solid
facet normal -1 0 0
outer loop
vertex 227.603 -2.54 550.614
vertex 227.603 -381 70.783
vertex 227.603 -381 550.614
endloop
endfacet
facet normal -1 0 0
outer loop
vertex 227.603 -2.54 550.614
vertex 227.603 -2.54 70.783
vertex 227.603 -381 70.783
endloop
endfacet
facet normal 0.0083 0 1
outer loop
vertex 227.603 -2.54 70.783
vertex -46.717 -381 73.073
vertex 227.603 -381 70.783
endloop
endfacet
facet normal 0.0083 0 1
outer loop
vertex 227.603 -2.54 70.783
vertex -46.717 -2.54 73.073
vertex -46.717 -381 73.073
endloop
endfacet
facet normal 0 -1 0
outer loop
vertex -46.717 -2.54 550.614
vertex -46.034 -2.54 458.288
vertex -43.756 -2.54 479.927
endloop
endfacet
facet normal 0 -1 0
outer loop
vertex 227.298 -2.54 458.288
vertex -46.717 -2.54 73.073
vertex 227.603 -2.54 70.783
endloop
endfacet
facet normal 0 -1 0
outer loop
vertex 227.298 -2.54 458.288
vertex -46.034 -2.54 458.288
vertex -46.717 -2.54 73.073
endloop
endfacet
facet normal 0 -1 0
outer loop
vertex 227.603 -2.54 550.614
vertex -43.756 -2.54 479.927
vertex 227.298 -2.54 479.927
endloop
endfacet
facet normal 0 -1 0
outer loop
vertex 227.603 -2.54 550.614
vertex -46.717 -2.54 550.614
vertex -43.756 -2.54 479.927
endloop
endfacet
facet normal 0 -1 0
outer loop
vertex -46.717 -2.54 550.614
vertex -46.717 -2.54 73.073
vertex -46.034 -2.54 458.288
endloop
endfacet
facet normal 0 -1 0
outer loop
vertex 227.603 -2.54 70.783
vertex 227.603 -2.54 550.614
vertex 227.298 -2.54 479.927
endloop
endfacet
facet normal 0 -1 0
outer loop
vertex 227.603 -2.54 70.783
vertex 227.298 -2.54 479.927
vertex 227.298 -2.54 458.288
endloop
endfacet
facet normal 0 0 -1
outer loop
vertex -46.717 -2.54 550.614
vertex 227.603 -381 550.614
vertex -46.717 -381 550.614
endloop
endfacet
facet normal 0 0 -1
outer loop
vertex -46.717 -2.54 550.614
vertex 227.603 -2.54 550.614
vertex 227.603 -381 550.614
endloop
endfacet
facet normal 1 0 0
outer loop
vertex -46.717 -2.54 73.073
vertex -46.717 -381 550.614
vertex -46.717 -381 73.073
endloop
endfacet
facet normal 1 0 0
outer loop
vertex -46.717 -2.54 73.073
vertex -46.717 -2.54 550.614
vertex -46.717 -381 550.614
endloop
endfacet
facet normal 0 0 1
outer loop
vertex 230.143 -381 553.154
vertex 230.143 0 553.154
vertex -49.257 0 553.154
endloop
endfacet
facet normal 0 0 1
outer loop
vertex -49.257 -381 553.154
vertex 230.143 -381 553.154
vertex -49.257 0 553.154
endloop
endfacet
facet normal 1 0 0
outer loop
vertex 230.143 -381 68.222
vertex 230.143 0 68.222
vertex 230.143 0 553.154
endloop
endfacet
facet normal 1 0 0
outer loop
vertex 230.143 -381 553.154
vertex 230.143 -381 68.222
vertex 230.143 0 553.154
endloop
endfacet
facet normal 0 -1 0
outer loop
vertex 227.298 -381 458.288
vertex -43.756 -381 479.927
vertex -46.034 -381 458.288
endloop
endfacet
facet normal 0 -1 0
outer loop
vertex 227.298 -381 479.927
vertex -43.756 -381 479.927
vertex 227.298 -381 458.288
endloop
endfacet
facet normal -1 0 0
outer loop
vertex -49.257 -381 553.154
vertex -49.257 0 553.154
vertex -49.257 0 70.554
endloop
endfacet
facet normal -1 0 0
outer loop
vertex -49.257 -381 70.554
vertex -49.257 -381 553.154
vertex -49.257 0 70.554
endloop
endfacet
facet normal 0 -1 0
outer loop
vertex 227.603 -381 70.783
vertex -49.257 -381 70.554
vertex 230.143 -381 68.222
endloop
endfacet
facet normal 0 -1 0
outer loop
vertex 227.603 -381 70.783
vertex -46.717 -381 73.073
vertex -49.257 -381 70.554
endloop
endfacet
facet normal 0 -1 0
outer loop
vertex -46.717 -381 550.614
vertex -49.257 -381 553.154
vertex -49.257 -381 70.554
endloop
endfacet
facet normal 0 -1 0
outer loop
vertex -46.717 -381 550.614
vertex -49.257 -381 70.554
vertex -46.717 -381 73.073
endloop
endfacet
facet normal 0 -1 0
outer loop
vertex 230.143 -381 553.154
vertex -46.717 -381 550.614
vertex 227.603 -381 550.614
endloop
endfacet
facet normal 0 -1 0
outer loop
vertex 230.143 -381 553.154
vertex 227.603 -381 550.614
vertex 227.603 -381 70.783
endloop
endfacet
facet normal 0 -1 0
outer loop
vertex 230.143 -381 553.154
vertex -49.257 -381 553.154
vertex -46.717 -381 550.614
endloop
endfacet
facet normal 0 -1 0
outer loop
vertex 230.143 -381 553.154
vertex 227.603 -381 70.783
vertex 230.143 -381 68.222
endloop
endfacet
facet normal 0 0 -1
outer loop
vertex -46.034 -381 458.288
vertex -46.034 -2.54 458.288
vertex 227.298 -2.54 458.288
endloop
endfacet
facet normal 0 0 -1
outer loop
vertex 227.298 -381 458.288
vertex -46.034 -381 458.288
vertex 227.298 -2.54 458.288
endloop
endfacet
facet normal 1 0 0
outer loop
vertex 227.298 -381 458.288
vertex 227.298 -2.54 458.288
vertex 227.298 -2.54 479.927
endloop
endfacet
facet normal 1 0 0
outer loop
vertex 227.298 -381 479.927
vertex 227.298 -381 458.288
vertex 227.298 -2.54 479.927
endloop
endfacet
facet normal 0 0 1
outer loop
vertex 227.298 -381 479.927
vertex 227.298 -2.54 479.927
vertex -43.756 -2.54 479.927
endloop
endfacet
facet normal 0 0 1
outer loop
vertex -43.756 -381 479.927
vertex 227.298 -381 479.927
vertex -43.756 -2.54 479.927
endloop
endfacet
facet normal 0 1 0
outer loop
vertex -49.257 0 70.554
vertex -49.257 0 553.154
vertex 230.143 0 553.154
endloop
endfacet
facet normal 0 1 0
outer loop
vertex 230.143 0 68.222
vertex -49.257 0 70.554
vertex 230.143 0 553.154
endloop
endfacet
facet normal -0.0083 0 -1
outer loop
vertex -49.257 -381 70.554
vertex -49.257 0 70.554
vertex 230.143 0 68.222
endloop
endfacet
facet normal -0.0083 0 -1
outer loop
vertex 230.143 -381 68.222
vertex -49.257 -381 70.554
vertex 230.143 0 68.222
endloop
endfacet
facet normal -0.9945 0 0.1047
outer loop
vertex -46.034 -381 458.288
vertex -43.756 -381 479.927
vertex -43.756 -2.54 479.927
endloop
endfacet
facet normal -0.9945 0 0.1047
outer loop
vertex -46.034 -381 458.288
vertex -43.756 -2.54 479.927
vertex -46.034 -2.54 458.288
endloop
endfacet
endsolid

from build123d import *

# Parameters (mm, degrees)
F1_DEPTH = 381
F2_T     = -2.54
F4_DEPTH = 381


with BuildPart() as f1:
    # F0 (on Front) → F1 (new body)
    with BuildSketch(Plane.XZ):
        Polygon((-49.257257, 553.153683), (-49.257257, 70.553683), (230.142743, 68.222205), (230.142743, 553.153683), align=None)
    extrude(amount=F1_DEPTH)

    # F2
    f2_openings = [f1.faces().sort_by_distance(p)[0] for p in [
        (90.554956, -381, 311.270346),
    ]]
    offset(amount=F2_T, openings=f2_openings)

    # F3 (on Front) → F4 (join)
    with BuildSketch(Plane.XZ):
        Polygon((227.298021, 479.927242), (-43.756042, 479.927242), (-46.033807, 458.288461), (227.298021, 458.288461), align=None)
    extrude(amount=F4_DEPTH)


solid = f1.part
